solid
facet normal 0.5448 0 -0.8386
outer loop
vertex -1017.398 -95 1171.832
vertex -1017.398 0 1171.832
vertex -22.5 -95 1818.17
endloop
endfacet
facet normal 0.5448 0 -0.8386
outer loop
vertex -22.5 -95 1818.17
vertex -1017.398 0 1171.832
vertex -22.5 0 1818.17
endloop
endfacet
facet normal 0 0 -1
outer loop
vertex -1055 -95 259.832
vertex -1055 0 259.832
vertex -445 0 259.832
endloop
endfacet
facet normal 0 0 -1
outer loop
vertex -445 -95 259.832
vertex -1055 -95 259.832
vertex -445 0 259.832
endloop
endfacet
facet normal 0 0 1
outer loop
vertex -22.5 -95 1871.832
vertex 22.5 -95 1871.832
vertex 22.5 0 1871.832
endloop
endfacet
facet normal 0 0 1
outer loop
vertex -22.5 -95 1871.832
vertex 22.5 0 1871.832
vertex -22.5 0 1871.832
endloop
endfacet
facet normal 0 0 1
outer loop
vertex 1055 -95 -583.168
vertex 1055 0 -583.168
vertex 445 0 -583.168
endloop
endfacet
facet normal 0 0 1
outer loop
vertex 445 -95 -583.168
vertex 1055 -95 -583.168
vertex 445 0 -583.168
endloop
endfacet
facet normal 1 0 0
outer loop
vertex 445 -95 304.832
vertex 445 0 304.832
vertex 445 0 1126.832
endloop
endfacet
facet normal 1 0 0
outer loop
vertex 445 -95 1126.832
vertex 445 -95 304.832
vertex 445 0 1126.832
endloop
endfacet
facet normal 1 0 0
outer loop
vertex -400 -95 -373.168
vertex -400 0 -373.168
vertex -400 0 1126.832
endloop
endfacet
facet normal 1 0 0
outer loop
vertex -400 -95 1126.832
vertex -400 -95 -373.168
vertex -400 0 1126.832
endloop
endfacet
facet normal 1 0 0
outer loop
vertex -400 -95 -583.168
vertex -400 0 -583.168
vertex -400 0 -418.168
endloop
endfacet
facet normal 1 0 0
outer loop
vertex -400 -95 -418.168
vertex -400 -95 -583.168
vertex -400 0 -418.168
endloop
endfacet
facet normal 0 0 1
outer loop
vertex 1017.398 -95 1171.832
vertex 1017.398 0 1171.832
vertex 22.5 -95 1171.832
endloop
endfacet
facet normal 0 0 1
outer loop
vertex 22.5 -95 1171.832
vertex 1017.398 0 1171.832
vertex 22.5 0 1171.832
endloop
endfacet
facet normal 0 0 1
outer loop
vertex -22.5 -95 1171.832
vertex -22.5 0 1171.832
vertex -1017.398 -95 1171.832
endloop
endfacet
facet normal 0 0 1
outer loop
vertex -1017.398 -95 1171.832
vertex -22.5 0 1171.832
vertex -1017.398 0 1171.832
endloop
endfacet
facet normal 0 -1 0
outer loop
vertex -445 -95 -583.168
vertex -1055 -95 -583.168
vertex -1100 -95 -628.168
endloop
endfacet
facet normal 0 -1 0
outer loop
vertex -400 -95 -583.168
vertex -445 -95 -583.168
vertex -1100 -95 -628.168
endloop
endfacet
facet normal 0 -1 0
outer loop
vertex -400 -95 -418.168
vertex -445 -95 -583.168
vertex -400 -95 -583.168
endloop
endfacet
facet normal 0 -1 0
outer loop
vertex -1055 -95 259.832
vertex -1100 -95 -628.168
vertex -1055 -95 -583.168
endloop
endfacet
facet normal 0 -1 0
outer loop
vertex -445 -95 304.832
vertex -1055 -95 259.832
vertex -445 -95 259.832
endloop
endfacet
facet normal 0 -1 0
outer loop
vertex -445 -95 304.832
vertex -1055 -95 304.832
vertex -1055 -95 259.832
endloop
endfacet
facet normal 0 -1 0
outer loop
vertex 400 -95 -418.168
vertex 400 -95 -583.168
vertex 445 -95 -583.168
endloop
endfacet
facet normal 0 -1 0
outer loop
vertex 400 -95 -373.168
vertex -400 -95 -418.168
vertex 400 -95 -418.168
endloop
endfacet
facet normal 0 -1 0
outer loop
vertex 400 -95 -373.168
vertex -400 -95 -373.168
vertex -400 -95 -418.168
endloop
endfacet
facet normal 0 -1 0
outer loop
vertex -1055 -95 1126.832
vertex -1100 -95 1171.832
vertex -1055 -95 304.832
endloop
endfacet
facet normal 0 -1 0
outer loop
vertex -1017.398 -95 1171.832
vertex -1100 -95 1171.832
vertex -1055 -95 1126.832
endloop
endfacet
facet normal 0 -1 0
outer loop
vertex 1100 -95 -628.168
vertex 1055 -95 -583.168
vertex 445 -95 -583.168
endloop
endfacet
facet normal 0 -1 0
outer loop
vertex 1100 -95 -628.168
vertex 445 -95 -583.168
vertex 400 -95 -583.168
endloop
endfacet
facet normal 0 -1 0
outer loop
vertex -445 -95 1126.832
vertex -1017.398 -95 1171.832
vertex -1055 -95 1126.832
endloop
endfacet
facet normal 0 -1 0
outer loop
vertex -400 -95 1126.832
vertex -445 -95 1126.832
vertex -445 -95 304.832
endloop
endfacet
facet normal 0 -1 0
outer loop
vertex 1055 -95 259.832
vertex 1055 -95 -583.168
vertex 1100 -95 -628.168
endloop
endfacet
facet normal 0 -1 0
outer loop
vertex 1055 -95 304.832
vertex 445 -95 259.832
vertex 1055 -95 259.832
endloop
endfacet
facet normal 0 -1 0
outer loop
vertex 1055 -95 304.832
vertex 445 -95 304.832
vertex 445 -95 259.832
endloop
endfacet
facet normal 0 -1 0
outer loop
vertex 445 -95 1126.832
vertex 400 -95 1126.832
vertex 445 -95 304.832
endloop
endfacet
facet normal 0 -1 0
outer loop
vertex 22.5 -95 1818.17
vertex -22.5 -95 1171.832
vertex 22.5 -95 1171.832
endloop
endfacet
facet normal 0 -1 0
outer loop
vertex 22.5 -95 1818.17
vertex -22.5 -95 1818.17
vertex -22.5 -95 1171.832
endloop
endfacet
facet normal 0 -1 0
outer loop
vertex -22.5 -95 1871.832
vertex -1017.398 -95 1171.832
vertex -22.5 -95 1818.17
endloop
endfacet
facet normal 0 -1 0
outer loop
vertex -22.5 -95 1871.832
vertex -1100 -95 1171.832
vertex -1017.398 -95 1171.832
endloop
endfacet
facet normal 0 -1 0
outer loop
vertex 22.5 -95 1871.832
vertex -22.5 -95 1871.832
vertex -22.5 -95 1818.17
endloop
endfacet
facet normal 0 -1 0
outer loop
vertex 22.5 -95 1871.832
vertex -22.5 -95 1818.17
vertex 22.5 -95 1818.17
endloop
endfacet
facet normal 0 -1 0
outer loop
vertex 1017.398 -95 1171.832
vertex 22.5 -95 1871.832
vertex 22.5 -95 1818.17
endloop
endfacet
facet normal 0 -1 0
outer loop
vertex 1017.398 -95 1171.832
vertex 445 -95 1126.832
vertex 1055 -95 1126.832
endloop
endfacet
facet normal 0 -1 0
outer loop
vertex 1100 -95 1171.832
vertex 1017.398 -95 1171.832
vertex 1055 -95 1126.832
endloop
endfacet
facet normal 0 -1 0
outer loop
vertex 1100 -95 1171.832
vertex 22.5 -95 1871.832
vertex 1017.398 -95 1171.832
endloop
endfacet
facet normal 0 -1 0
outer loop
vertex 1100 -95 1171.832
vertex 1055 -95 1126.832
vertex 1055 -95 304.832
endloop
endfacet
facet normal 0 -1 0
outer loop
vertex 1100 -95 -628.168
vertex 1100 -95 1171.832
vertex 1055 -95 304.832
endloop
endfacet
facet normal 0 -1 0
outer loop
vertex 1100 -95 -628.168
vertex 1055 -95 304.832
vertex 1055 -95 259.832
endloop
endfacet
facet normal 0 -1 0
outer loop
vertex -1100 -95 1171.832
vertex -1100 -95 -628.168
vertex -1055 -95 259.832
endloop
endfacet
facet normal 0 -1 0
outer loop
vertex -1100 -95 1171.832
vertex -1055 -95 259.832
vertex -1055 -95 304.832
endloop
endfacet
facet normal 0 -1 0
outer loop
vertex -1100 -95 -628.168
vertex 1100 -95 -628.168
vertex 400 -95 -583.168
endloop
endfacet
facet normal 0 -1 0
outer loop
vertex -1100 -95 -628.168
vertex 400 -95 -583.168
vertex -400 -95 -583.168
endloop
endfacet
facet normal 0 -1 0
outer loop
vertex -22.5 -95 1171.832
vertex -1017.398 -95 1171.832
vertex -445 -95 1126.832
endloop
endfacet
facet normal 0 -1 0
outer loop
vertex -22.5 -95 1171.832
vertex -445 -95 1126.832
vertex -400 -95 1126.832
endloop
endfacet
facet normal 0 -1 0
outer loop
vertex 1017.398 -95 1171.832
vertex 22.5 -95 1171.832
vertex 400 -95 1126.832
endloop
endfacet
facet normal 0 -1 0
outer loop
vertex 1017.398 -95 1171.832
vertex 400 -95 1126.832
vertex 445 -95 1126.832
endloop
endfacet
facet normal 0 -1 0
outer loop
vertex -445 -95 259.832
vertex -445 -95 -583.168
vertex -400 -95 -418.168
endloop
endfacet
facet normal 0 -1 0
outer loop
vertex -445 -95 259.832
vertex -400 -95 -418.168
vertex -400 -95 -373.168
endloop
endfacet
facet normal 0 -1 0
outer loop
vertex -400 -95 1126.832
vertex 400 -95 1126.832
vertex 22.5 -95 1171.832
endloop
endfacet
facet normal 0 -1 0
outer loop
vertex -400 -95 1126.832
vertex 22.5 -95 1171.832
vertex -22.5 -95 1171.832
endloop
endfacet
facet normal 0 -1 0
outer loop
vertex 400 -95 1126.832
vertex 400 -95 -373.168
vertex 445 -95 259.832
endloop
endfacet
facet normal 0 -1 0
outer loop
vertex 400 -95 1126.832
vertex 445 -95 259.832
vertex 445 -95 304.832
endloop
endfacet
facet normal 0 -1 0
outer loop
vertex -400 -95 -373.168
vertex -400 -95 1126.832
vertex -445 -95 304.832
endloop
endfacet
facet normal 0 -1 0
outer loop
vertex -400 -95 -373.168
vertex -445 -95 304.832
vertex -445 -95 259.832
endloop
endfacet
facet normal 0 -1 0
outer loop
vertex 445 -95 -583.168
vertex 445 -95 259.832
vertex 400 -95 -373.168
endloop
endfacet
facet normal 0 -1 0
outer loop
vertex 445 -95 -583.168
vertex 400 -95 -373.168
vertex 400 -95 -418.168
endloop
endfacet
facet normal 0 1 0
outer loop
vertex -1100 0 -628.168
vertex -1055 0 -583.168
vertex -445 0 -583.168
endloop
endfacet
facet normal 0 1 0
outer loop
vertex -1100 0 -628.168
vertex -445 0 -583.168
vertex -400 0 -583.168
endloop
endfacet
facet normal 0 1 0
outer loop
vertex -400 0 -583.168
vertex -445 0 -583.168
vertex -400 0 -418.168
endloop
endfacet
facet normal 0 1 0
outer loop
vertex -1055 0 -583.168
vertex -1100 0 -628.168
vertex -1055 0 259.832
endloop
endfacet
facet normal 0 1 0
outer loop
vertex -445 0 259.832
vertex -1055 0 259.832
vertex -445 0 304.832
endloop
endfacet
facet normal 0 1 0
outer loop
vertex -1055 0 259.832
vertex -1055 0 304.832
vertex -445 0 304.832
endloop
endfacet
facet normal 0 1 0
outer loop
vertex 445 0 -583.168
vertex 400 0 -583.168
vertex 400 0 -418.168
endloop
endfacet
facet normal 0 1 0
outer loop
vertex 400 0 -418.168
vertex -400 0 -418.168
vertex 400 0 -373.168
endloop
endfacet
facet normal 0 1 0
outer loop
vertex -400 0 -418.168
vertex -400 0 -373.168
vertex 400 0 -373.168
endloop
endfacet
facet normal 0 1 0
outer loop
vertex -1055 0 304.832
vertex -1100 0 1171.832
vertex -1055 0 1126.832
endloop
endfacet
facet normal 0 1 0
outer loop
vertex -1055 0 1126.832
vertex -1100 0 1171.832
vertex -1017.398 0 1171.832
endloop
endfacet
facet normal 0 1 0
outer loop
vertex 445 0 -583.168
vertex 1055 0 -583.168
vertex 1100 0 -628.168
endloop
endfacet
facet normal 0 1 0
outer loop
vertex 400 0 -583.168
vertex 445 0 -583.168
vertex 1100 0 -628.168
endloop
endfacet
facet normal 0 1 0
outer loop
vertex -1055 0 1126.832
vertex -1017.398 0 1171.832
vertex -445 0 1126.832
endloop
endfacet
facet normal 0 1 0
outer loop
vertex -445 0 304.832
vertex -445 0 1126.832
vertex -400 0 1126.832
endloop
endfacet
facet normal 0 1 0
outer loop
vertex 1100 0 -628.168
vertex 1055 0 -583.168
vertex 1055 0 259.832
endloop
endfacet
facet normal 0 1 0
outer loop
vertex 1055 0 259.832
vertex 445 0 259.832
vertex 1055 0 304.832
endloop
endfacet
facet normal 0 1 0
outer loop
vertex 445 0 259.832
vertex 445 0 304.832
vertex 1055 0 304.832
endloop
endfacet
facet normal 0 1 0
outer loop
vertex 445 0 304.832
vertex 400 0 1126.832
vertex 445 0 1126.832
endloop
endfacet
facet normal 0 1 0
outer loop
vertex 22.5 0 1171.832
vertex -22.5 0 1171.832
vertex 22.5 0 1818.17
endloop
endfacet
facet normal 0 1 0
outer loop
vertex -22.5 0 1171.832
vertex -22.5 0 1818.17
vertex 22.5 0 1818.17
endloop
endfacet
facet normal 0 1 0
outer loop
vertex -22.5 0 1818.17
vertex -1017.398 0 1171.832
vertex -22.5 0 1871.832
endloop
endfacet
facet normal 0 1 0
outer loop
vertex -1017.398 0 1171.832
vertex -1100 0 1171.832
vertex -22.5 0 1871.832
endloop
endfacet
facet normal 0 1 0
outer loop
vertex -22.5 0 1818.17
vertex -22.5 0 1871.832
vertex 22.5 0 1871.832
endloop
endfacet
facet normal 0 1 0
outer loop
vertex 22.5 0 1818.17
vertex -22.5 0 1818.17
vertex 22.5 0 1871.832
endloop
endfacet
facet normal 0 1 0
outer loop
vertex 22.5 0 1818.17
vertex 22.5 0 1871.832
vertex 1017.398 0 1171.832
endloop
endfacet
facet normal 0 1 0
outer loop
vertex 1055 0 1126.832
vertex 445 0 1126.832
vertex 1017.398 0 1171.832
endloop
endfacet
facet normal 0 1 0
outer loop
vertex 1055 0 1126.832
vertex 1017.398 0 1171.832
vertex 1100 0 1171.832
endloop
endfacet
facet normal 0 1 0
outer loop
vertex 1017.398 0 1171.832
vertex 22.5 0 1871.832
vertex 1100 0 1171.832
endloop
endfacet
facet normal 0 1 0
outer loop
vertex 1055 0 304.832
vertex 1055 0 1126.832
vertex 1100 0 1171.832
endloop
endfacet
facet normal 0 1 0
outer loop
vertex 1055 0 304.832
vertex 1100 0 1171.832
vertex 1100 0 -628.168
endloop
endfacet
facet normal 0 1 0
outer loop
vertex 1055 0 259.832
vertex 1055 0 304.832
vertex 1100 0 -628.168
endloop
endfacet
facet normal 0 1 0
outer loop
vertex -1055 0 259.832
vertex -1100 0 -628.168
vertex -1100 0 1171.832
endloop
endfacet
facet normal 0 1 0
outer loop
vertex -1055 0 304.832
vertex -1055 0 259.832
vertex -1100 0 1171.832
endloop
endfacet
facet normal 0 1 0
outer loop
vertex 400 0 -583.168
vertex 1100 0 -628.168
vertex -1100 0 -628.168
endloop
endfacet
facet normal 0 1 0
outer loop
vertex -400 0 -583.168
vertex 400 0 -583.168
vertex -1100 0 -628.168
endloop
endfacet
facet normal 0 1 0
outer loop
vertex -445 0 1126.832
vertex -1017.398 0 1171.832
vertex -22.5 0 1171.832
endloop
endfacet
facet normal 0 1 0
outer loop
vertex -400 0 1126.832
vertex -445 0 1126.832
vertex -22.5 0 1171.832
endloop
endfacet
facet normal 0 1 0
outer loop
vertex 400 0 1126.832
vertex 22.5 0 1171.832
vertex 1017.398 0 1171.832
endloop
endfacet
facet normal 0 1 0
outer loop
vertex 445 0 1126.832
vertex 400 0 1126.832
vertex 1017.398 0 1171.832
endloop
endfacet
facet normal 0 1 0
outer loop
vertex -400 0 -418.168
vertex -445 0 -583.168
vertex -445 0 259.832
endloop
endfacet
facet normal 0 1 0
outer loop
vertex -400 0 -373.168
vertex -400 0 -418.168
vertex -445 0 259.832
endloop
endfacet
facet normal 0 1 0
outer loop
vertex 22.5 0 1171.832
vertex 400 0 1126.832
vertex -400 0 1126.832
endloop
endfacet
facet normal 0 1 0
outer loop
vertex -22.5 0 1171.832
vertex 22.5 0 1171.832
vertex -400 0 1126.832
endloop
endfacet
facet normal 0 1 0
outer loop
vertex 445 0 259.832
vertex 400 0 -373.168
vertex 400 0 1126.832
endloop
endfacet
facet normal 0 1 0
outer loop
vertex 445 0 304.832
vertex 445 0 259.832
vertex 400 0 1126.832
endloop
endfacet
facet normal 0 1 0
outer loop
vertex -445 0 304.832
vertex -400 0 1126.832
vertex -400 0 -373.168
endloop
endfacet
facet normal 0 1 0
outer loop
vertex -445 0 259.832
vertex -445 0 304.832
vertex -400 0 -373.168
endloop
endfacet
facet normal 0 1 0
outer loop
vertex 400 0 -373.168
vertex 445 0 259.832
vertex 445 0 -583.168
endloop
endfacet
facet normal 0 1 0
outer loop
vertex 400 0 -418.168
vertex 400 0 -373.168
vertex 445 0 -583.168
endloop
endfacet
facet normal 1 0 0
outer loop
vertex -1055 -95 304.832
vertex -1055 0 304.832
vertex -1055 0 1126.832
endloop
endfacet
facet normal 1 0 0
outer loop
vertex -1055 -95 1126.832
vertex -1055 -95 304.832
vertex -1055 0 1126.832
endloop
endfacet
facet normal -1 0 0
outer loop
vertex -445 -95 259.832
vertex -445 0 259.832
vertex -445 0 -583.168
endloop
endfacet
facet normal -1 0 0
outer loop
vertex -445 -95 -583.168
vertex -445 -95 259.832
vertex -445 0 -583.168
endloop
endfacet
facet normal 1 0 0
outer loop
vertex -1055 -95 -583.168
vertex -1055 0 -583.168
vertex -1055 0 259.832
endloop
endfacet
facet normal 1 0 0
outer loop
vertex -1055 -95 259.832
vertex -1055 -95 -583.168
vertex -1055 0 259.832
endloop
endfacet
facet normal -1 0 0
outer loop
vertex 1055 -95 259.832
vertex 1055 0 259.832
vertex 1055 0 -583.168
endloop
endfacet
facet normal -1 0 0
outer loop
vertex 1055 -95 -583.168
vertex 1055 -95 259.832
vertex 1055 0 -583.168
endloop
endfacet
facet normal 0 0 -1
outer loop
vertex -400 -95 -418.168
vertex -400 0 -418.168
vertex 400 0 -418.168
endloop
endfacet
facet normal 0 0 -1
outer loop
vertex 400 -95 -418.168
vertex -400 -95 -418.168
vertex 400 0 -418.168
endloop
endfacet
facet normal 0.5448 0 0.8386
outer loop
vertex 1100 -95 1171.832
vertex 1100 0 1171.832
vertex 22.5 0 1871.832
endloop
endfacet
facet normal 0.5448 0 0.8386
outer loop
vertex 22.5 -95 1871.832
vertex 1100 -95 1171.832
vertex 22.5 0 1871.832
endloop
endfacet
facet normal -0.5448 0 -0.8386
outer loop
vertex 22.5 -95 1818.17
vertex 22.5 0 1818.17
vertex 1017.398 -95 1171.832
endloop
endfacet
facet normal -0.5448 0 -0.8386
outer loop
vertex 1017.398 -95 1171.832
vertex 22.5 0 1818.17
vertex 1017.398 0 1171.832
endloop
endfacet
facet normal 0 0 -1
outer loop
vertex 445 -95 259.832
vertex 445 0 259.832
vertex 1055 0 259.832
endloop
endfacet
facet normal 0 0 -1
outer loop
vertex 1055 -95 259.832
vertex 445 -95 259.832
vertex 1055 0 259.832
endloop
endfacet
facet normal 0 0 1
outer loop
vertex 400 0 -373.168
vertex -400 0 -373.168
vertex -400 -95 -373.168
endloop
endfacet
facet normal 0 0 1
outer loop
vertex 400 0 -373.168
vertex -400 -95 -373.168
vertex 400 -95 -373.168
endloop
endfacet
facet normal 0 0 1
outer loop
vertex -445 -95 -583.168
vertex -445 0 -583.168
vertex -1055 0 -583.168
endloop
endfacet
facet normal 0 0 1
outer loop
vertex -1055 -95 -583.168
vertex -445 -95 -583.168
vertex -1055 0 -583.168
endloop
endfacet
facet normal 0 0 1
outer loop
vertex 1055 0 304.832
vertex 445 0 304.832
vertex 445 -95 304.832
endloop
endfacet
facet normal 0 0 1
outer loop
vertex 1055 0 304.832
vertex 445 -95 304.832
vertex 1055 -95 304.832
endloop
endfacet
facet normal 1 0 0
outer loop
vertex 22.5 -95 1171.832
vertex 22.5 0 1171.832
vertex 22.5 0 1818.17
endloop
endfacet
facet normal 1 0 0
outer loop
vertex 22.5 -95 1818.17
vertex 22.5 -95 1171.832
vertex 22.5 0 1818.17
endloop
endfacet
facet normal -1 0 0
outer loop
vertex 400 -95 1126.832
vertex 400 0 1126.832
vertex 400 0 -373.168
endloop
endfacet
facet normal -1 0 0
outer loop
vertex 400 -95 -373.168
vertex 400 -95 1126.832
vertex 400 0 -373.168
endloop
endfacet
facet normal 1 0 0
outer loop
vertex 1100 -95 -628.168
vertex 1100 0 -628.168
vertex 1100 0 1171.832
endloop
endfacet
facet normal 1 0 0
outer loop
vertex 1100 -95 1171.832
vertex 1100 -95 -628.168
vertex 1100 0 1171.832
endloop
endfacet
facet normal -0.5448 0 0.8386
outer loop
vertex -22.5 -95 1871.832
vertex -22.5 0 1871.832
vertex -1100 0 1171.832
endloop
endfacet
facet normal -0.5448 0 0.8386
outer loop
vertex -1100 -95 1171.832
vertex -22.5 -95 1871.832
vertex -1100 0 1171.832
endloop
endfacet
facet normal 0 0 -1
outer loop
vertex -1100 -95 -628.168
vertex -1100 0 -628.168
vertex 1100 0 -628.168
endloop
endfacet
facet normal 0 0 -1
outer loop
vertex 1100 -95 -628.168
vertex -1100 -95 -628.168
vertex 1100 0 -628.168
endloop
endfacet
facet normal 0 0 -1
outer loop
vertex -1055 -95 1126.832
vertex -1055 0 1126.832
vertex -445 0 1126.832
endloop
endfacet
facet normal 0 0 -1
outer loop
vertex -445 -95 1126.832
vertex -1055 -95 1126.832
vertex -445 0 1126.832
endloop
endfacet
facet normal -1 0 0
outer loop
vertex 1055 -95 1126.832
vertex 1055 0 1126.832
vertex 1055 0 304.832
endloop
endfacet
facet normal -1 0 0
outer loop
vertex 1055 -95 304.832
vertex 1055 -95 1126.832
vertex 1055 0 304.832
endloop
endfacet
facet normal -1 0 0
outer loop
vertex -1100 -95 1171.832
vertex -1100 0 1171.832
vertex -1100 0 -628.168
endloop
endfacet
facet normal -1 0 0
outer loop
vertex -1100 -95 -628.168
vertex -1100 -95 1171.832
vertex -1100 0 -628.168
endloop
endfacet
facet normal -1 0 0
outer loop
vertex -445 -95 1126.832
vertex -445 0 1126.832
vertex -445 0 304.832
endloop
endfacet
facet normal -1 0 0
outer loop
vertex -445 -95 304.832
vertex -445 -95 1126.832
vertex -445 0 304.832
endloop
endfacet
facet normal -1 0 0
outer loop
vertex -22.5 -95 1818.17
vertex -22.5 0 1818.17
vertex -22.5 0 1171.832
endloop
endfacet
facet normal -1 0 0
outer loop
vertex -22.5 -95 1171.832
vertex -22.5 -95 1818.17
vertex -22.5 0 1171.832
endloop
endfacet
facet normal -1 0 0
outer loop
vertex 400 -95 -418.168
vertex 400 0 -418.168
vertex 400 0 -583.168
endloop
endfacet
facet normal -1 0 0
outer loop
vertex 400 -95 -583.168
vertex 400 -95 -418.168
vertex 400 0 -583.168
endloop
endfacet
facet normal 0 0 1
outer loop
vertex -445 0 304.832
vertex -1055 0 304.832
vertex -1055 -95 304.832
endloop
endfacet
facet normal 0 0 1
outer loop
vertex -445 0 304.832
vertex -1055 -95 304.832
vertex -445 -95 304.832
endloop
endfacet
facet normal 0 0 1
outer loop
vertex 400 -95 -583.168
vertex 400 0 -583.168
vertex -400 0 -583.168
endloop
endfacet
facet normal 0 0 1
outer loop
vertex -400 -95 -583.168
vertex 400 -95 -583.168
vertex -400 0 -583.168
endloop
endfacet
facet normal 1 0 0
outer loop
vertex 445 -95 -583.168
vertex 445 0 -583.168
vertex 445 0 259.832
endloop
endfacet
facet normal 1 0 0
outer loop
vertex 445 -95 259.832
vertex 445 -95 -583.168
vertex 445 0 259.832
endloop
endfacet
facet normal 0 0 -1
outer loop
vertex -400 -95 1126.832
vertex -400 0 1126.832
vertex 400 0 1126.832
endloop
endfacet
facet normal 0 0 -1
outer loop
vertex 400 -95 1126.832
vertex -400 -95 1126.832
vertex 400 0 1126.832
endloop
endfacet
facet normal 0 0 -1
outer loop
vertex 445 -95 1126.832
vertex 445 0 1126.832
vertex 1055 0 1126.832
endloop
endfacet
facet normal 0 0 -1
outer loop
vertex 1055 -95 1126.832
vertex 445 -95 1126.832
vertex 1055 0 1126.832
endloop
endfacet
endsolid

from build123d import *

# Parameters (mm, degrees)
F0_W     = 610
F0_H     = 45
F0_W_2   = 800
F1_DEPTH = 95


# Not quite as in the source:
# - a feature names something its author has since deleted; it is built from what else it names


with BuildPart() as f1:
    # F0 (on Front) → F1 (new body)
    with BuildSketch(Plane.XZ):
        Polygon((1100, -628.1681121112), (1100, -583.1681121112), (1055, -583.1681121112), (445, -583.1681121112), (400, -583.1681121112), (-400, -583.1681121112), (-445, -583.1681121112), (-1055, -583.1681121112), (-1100, -583.1681121112), (-1100, -628.1681121112), align=None)
        Polygon((1055, -583.1681121112), (1100, -583.1681121112), (1100, 1126.8318878888), (1055, 1126.8318878888), (1055, 304.8318878888), (1055, 259.8318878888), align=None)
        Polygon((1055, 1126.8318878888), (1100, 1126.8318878888), (1100, 1171.8318878888), (1017.398329114, 1171.8318878888), (22.5, 1171.8318878888), (-22.5, 1171.8318878888), (-1017.398329114, 1171.8318878888), (-1100, 1171.8318878888), (-1100, 1126.8318878888), (-1055, 1126.8318878888), (-445, 1126.8318878888), (-400, 1126.8318878888), (400, 1126.8318878888), (445, 1126.8318878888), align=None)
        Polygon((1017.398329114, 1171.8318878888), (1100, 1171.8318878888), (22.5, 1871.8318878888), (22.5, 1818.1695494942), align=None)
        Polygon((-1100, 1126.8318878888), (-1100, -583.1681121112), (-1055, -583.1681121112), (-1055, 259.8318878888), (-1055, 304.8318878888), (-1055, 1126.8318878888), align=None)
        Polygon((22.5, 1818.1695494942), (22.5, 1871.8318878888), (-22.5, 1871.8318878888), (-22.5, 1818.1695494942), (-22.5, 1171.8318878888), (22.5, 1171.8318878888), align=None)
        Polygon((-22.5, 1818.1695494942), (-22.5, 1871.8318878888), (-1100, 1171.8318878888), (-1017.398329114, 1171.8318878888), align=None)
        Polygon((-445, -583.1681121112), (-400, -583.1681121112), (-400, -418.1681121112), (-400, -373.1681121112), (-400, 1126.8318878888), (-445, 1126.8318878888), (-445, 304.8318878888), (-445, 259.8318878888), align=None)
        Polygon((400, -583.1681121112), (445, -583.1681121112), (445, 259.8318878888), (445, 304.8318878888), (445, 1126.8318878888), (400, 1126.8318878888), (400, -373.1681121112), (400, -418.1681121112), align=None)
        with Locations((750, 282.3318878888)):
            Rectangle(F0_W, F0_H)
        with Locations((-750, 282.3318878888)):
            Rectangle(F0_W, F0_H)
        with Locations((0, -395.6681121112)):
            Rectangle(F0_W_2, F0_H)
    extrude(amount=F1_DEPTH)


solid = f1.part
